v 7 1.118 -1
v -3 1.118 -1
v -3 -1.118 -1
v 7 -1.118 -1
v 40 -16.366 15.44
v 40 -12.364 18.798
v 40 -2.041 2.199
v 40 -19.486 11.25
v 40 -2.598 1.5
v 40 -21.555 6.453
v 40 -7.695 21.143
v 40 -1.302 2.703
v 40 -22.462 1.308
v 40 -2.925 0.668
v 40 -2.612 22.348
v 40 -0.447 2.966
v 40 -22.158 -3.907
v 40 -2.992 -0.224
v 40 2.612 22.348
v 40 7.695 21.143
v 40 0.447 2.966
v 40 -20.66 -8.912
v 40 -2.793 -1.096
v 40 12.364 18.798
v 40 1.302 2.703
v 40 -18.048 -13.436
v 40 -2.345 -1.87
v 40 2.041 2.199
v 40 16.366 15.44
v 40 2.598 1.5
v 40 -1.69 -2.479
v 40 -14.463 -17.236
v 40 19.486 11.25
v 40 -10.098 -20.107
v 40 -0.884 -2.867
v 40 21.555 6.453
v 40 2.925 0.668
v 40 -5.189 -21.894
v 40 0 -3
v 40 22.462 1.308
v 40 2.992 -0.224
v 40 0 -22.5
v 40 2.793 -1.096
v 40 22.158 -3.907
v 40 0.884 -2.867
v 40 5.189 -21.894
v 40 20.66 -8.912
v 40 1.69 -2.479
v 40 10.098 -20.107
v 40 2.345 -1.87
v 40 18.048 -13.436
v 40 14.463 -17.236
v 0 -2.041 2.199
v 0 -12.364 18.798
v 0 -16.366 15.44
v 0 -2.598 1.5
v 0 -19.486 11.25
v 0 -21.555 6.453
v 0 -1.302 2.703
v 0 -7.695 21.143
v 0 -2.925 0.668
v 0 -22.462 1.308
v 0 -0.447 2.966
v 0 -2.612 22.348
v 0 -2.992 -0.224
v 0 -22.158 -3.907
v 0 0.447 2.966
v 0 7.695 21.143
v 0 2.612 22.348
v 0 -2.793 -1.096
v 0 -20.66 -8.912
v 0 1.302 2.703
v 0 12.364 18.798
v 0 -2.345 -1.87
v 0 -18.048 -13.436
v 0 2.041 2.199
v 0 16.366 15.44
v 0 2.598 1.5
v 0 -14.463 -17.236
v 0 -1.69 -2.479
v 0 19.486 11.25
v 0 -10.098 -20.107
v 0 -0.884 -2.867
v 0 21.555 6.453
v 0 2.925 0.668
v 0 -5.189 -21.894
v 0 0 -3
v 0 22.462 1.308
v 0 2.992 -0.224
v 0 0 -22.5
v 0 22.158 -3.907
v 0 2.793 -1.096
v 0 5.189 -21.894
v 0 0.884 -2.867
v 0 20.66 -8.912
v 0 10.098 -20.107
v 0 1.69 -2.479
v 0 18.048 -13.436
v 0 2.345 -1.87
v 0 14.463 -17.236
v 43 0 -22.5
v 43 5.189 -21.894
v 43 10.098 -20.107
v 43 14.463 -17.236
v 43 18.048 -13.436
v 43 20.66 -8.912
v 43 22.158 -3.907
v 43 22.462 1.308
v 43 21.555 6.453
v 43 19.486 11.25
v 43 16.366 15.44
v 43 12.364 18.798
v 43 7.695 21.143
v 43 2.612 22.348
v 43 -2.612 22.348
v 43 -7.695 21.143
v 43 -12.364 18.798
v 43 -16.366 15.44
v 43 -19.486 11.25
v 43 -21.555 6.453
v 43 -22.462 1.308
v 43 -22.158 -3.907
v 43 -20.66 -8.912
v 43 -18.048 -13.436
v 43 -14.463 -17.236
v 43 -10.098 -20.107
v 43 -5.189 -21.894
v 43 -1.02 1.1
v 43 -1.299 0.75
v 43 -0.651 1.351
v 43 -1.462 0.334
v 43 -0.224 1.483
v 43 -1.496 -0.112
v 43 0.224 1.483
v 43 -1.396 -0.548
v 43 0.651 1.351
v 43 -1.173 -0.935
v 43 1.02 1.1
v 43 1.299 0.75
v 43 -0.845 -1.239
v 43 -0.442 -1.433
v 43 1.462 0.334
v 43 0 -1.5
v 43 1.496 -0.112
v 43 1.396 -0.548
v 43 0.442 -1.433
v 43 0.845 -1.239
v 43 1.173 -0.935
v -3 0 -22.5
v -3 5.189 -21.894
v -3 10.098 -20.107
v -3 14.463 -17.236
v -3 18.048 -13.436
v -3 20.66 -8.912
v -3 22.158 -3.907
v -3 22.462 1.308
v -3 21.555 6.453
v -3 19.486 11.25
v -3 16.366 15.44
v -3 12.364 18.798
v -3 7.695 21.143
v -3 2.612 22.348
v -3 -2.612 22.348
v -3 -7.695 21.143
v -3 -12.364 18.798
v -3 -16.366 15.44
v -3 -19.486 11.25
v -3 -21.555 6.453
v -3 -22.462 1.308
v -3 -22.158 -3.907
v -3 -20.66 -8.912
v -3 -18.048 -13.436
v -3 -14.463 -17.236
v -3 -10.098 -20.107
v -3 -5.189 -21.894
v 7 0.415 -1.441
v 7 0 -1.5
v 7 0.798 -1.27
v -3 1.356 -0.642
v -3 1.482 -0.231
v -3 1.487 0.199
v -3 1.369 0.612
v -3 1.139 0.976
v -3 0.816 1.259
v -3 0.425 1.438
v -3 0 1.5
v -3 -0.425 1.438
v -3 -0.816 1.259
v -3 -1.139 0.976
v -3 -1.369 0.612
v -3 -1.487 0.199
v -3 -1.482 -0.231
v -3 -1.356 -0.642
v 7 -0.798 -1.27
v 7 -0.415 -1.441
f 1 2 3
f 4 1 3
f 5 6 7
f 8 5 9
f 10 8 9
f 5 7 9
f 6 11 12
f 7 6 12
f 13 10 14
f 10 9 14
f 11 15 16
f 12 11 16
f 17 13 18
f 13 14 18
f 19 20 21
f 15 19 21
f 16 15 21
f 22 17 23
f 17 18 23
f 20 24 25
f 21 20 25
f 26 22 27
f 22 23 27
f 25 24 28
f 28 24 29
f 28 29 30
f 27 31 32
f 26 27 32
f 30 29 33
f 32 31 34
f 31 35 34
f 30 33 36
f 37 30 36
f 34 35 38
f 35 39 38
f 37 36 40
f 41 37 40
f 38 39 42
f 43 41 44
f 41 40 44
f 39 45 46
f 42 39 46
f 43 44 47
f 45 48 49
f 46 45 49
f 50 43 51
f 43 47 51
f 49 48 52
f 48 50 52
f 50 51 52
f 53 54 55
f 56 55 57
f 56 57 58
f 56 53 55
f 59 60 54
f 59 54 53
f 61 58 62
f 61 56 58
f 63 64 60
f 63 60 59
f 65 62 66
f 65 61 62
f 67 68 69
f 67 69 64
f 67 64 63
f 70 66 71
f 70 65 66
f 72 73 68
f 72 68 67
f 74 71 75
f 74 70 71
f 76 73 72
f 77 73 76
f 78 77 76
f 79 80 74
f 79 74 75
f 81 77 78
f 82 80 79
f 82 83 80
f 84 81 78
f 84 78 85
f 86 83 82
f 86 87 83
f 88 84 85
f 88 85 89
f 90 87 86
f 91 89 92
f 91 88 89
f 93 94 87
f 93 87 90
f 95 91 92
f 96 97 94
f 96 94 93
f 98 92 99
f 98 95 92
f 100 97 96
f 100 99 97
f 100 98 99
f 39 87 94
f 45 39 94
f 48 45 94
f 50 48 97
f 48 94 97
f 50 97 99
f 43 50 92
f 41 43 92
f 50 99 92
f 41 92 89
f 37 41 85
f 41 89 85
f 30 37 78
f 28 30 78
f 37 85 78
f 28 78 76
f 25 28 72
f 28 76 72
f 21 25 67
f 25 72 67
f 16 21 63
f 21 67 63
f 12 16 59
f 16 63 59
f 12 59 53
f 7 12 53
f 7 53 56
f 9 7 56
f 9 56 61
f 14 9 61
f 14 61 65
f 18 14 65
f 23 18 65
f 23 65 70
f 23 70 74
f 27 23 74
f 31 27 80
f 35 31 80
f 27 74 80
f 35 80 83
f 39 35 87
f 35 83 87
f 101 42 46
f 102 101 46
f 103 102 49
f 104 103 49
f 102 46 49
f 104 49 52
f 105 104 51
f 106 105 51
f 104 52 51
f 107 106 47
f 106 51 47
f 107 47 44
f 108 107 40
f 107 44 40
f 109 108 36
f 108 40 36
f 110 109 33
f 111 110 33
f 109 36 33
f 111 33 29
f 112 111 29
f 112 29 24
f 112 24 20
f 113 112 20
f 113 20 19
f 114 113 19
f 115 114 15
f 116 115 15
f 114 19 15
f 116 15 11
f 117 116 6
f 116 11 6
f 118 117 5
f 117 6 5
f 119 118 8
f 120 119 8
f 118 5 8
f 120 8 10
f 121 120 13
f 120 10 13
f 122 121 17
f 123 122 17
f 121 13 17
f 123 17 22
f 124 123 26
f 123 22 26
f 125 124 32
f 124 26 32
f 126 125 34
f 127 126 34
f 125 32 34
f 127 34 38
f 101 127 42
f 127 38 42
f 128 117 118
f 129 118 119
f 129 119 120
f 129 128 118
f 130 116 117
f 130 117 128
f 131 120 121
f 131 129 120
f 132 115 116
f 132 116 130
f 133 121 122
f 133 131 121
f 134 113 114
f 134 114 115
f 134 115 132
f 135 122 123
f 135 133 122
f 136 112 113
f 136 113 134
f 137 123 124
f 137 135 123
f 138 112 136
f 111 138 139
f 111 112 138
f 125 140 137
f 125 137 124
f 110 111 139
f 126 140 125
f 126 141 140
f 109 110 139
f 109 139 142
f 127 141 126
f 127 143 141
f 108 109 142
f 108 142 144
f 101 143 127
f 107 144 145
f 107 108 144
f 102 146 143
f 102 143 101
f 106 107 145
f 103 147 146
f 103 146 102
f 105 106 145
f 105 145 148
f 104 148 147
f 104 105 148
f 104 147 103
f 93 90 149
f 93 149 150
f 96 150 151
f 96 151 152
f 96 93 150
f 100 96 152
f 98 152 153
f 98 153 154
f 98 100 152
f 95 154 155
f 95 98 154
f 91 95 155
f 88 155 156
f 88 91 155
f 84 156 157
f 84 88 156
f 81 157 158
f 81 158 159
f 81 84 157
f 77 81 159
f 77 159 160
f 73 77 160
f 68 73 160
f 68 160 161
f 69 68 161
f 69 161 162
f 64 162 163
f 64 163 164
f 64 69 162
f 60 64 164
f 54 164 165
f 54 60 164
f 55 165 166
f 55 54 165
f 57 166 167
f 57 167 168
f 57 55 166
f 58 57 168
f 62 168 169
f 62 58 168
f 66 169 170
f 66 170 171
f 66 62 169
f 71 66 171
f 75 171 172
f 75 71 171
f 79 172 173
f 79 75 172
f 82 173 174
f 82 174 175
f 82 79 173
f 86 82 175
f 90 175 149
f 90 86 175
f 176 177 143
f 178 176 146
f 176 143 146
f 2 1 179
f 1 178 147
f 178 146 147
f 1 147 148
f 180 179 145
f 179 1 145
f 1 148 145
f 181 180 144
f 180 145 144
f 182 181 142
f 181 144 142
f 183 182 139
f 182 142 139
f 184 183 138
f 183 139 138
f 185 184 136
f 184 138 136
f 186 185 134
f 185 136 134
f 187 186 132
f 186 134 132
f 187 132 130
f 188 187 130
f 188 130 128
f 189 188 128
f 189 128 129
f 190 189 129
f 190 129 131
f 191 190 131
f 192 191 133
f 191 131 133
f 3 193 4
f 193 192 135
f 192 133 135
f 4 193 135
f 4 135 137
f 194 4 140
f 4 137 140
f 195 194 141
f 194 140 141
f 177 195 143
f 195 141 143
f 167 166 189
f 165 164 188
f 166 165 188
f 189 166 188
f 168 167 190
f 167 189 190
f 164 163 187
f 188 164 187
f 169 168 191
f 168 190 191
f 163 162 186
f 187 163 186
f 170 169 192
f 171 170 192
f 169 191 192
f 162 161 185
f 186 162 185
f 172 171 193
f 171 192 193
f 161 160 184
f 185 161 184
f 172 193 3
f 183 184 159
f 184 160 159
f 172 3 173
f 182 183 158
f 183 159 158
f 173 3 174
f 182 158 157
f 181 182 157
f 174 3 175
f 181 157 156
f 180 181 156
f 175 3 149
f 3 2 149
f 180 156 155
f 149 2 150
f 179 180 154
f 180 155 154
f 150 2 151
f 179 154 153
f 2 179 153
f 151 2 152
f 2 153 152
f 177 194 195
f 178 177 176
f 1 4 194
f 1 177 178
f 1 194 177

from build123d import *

# Parameters (mm, degrees)
SKETCH1_R           = 3
SKETCH1_R_2         = 1.5
BOSS_EXTRUDE1_DEPTH = 40
SKETCH2_R           = 22.5
SKETCH2_R_2         = 1.5
BOSS_EXTRUDE2_DEPTH = 3
BOSS_EXTRUDE4_DEPTH = 10


with BuildPart() as part:
    # Sketch1 → Boss-Extrude1 (new body)
    with BuildSketch(Plane(origin=(0, 0, 0), x_dir=(0, 0, -1), z_dir=(1, 0, 0))):
        Circle(SKETCH1_R)
        Circle(SKETCH1_R_2, mode=Mode.SUBTRACT)
    extrude(amount=BOSS_EXTRUDE1_DEPTH)

    # Sketch2 → Boss-Extrude2 (add)
    with BuildSketch(Plane(origin=(40, 0, 0), x_dir=(0, 0, -1), z_dir=(1, 0, 0))):
        Circle(SKETCH2_R)
        Circle(SKETCH2_R_2, mode=Mode.SUBTRACT)
    boss_extrude2 = extrude(amount=BOSS_EXTRUDE2_DEPTH)

    # Mirror1: Boss-Extrude2 across plane
    add(boss_extrude2.mirror(Plane(origin=(20, 0, 0), x_dir=(0, 0, 1), z_dir=(1, 0, 0))))

    # Sketch4 → Boss-Extrude4 (add)
    with BuildSketch(Plane.ZY.offset(3)):
        with BuildLine():
            Line((-1, 1.118033989), (-1, -1.118033989))
            ThreePointArc((-1, -1.118033989), (-1.5, 0), (-1, 1.118033989))
        make_face()
    extrude(amount=-BOSS_EXTRUDE4_DEPTH)


solid = part.part
